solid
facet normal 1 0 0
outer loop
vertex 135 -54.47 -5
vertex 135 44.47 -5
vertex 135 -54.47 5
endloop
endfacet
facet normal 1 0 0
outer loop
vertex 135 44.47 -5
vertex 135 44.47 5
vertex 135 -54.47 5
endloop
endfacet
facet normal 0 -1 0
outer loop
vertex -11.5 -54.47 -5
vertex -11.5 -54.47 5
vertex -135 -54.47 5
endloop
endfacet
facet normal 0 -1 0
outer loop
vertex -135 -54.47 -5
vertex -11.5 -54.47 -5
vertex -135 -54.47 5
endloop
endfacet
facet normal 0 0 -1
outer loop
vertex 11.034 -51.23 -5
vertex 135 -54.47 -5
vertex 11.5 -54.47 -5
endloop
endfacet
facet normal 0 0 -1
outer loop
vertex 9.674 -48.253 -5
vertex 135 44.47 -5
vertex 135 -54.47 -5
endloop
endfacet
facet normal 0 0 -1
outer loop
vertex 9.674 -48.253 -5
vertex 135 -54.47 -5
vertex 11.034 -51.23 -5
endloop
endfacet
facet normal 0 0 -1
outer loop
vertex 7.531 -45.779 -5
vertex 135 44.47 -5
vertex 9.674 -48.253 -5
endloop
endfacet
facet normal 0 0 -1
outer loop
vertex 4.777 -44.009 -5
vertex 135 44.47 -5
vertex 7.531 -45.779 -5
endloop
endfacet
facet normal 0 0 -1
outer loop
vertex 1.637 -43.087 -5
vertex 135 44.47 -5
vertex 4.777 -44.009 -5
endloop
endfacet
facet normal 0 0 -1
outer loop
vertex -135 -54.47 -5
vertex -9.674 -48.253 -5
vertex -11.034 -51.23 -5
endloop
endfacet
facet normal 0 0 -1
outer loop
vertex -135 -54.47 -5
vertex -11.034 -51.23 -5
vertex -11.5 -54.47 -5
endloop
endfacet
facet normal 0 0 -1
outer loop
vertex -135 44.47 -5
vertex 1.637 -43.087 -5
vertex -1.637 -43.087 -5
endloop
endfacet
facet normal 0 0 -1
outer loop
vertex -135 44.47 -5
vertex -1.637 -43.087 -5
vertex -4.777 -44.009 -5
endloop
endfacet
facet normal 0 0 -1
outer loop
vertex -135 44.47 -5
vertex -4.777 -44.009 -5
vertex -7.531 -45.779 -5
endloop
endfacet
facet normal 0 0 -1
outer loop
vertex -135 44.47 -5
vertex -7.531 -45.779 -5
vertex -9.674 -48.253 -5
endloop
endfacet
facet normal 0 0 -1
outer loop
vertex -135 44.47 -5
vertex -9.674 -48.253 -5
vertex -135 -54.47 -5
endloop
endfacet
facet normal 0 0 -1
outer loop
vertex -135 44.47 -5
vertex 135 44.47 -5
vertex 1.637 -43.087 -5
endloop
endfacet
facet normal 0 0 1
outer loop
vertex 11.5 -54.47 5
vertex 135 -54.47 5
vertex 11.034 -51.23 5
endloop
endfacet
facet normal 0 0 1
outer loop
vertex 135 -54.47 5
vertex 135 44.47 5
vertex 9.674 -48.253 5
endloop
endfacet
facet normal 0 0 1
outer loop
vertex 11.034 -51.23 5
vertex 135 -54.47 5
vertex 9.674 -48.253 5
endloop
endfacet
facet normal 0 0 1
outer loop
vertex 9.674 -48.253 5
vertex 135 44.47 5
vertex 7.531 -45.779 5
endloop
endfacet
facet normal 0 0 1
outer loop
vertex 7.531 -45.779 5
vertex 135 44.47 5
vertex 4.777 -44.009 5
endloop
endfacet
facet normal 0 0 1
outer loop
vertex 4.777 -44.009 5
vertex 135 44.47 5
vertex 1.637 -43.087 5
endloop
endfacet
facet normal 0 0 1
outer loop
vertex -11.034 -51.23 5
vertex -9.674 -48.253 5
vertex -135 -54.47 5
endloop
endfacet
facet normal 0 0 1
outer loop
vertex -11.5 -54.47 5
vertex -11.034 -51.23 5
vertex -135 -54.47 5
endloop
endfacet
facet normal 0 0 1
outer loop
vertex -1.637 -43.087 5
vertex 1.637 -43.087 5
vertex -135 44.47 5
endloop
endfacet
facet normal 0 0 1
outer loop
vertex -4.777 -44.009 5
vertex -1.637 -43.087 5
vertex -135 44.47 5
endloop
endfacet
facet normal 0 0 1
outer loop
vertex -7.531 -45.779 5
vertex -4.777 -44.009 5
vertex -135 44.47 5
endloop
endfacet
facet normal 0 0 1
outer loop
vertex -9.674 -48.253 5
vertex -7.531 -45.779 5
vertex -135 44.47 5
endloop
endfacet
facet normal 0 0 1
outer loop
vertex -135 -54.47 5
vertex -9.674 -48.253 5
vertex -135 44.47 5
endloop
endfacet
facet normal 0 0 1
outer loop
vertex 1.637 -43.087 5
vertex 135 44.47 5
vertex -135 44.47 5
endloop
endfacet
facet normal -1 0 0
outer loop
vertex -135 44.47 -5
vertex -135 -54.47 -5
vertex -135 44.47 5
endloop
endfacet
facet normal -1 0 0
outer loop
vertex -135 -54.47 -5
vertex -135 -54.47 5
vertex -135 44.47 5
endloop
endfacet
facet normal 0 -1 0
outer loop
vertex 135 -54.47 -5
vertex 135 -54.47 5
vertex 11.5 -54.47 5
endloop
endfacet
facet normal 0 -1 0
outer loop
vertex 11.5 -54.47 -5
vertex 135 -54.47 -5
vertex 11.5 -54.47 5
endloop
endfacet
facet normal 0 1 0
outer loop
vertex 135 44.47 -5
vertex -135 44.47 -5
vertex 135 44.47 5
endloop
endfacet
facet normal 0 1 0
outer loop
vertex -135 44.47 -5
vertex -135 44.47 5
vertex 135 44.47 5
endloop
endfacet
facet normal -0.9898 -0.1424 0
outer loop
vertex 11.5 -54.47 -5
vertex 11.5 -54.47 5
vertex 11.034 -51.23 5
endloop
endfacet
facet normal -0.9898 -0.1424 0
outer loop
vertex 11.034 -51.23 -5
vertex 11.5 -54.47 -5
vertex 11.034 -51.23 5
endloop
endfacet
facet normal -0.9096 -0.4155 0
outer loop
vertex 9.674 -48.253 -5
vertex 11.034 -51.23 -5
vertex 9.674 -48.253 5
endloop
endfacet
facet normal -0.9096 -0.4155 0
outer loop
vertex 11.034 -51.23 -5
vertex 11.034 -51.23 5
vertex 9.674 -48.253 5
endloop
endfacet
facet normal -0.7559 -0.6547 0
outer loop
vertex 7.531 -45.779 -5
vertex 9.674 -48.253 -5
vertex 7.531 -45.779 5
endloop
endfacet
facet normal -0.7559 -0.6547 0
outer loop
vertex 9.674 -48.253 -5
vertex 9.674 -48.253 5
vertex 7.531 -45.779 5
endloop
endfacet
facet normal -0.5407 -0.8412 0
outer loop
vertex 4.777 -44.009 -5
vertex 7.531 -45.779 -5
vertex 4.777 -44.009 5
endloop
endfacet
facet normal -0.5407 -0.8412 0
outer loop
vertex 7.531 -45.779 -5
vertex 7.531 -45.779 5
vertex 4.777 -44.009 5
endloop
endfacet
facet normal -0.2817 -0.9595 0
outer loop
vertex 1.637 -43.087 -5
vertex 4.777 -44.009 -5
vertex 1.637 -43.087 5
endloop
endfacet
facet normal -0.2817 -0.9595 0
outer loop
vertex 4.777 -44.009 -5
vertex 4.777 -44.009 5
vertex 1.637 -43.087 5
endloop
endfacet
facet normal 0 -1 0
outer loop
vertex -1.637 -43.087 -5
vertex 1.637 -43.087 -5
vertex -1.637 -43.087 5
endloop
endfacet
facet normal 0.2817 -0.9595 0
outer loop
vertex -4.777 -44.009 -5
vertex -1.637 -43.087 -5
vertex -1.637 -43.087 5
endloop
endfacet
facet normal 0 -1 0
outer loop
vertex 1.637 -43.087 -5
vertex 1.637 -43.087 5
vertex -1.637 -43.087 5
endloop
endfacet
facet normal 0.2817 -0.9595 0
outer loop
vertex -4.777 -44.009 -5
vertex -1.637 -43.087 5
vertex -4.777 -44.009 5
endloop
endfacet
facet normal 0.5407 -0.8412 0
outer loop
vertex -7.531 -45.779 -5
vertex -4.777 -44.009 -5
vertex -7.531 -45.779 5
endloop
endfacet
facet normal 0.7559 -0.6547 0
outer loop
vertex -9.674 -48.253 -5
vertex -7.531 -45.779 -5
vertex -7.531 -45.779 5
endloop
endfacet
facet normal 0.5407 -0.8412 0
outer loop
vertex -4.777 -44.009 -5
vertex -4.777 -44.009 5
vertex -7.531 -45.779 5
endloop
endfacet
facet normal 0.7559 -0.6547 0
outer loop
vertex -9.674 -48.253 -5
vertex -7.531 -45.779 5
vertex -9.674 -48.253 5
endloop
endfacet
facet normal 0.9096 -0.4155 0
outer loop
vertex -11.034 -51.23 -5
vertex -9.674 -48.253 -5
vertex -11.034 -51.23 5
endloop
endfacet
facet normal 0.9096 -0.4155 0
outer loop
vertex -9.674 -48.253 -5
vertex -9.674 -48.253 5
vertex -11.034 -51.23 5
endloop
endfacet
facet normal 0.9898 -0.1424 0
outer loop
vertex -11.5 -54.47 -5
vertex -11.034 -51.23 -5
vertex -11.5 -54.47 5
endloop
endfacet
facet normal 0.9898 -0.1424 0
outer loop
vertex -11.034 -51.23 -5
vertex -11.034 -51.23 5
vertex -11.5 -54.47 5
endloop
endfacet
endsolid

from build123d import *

# Parameters (mm, degrees)
BOSS_EXTRUDE1_DEPTH = 5


with BuildPart() as part:
    # Sketch1 → Boss-Extrude1 (new body, symmetric)
    with BuildSketch(Plane.XY):
        with BuildLine():
            Line((-11.5, -54.47), (-135, -54.47))
            Line((-135, -54.47), (-135, 44.47))
            Line((-135, 44.47), (135, 44.47))
            Line((135, 44.47), (135, -54.47))
            Line((135, -54.47), (11.5, -54.47))
            ThreePointArc((11.5, -54.47), (0, -42.97), (-11.5, -54.47))
        make_face()
    extrude(amount=BOSS_EXTRUDE1_DEPTH, both=True)


solid = part.part
